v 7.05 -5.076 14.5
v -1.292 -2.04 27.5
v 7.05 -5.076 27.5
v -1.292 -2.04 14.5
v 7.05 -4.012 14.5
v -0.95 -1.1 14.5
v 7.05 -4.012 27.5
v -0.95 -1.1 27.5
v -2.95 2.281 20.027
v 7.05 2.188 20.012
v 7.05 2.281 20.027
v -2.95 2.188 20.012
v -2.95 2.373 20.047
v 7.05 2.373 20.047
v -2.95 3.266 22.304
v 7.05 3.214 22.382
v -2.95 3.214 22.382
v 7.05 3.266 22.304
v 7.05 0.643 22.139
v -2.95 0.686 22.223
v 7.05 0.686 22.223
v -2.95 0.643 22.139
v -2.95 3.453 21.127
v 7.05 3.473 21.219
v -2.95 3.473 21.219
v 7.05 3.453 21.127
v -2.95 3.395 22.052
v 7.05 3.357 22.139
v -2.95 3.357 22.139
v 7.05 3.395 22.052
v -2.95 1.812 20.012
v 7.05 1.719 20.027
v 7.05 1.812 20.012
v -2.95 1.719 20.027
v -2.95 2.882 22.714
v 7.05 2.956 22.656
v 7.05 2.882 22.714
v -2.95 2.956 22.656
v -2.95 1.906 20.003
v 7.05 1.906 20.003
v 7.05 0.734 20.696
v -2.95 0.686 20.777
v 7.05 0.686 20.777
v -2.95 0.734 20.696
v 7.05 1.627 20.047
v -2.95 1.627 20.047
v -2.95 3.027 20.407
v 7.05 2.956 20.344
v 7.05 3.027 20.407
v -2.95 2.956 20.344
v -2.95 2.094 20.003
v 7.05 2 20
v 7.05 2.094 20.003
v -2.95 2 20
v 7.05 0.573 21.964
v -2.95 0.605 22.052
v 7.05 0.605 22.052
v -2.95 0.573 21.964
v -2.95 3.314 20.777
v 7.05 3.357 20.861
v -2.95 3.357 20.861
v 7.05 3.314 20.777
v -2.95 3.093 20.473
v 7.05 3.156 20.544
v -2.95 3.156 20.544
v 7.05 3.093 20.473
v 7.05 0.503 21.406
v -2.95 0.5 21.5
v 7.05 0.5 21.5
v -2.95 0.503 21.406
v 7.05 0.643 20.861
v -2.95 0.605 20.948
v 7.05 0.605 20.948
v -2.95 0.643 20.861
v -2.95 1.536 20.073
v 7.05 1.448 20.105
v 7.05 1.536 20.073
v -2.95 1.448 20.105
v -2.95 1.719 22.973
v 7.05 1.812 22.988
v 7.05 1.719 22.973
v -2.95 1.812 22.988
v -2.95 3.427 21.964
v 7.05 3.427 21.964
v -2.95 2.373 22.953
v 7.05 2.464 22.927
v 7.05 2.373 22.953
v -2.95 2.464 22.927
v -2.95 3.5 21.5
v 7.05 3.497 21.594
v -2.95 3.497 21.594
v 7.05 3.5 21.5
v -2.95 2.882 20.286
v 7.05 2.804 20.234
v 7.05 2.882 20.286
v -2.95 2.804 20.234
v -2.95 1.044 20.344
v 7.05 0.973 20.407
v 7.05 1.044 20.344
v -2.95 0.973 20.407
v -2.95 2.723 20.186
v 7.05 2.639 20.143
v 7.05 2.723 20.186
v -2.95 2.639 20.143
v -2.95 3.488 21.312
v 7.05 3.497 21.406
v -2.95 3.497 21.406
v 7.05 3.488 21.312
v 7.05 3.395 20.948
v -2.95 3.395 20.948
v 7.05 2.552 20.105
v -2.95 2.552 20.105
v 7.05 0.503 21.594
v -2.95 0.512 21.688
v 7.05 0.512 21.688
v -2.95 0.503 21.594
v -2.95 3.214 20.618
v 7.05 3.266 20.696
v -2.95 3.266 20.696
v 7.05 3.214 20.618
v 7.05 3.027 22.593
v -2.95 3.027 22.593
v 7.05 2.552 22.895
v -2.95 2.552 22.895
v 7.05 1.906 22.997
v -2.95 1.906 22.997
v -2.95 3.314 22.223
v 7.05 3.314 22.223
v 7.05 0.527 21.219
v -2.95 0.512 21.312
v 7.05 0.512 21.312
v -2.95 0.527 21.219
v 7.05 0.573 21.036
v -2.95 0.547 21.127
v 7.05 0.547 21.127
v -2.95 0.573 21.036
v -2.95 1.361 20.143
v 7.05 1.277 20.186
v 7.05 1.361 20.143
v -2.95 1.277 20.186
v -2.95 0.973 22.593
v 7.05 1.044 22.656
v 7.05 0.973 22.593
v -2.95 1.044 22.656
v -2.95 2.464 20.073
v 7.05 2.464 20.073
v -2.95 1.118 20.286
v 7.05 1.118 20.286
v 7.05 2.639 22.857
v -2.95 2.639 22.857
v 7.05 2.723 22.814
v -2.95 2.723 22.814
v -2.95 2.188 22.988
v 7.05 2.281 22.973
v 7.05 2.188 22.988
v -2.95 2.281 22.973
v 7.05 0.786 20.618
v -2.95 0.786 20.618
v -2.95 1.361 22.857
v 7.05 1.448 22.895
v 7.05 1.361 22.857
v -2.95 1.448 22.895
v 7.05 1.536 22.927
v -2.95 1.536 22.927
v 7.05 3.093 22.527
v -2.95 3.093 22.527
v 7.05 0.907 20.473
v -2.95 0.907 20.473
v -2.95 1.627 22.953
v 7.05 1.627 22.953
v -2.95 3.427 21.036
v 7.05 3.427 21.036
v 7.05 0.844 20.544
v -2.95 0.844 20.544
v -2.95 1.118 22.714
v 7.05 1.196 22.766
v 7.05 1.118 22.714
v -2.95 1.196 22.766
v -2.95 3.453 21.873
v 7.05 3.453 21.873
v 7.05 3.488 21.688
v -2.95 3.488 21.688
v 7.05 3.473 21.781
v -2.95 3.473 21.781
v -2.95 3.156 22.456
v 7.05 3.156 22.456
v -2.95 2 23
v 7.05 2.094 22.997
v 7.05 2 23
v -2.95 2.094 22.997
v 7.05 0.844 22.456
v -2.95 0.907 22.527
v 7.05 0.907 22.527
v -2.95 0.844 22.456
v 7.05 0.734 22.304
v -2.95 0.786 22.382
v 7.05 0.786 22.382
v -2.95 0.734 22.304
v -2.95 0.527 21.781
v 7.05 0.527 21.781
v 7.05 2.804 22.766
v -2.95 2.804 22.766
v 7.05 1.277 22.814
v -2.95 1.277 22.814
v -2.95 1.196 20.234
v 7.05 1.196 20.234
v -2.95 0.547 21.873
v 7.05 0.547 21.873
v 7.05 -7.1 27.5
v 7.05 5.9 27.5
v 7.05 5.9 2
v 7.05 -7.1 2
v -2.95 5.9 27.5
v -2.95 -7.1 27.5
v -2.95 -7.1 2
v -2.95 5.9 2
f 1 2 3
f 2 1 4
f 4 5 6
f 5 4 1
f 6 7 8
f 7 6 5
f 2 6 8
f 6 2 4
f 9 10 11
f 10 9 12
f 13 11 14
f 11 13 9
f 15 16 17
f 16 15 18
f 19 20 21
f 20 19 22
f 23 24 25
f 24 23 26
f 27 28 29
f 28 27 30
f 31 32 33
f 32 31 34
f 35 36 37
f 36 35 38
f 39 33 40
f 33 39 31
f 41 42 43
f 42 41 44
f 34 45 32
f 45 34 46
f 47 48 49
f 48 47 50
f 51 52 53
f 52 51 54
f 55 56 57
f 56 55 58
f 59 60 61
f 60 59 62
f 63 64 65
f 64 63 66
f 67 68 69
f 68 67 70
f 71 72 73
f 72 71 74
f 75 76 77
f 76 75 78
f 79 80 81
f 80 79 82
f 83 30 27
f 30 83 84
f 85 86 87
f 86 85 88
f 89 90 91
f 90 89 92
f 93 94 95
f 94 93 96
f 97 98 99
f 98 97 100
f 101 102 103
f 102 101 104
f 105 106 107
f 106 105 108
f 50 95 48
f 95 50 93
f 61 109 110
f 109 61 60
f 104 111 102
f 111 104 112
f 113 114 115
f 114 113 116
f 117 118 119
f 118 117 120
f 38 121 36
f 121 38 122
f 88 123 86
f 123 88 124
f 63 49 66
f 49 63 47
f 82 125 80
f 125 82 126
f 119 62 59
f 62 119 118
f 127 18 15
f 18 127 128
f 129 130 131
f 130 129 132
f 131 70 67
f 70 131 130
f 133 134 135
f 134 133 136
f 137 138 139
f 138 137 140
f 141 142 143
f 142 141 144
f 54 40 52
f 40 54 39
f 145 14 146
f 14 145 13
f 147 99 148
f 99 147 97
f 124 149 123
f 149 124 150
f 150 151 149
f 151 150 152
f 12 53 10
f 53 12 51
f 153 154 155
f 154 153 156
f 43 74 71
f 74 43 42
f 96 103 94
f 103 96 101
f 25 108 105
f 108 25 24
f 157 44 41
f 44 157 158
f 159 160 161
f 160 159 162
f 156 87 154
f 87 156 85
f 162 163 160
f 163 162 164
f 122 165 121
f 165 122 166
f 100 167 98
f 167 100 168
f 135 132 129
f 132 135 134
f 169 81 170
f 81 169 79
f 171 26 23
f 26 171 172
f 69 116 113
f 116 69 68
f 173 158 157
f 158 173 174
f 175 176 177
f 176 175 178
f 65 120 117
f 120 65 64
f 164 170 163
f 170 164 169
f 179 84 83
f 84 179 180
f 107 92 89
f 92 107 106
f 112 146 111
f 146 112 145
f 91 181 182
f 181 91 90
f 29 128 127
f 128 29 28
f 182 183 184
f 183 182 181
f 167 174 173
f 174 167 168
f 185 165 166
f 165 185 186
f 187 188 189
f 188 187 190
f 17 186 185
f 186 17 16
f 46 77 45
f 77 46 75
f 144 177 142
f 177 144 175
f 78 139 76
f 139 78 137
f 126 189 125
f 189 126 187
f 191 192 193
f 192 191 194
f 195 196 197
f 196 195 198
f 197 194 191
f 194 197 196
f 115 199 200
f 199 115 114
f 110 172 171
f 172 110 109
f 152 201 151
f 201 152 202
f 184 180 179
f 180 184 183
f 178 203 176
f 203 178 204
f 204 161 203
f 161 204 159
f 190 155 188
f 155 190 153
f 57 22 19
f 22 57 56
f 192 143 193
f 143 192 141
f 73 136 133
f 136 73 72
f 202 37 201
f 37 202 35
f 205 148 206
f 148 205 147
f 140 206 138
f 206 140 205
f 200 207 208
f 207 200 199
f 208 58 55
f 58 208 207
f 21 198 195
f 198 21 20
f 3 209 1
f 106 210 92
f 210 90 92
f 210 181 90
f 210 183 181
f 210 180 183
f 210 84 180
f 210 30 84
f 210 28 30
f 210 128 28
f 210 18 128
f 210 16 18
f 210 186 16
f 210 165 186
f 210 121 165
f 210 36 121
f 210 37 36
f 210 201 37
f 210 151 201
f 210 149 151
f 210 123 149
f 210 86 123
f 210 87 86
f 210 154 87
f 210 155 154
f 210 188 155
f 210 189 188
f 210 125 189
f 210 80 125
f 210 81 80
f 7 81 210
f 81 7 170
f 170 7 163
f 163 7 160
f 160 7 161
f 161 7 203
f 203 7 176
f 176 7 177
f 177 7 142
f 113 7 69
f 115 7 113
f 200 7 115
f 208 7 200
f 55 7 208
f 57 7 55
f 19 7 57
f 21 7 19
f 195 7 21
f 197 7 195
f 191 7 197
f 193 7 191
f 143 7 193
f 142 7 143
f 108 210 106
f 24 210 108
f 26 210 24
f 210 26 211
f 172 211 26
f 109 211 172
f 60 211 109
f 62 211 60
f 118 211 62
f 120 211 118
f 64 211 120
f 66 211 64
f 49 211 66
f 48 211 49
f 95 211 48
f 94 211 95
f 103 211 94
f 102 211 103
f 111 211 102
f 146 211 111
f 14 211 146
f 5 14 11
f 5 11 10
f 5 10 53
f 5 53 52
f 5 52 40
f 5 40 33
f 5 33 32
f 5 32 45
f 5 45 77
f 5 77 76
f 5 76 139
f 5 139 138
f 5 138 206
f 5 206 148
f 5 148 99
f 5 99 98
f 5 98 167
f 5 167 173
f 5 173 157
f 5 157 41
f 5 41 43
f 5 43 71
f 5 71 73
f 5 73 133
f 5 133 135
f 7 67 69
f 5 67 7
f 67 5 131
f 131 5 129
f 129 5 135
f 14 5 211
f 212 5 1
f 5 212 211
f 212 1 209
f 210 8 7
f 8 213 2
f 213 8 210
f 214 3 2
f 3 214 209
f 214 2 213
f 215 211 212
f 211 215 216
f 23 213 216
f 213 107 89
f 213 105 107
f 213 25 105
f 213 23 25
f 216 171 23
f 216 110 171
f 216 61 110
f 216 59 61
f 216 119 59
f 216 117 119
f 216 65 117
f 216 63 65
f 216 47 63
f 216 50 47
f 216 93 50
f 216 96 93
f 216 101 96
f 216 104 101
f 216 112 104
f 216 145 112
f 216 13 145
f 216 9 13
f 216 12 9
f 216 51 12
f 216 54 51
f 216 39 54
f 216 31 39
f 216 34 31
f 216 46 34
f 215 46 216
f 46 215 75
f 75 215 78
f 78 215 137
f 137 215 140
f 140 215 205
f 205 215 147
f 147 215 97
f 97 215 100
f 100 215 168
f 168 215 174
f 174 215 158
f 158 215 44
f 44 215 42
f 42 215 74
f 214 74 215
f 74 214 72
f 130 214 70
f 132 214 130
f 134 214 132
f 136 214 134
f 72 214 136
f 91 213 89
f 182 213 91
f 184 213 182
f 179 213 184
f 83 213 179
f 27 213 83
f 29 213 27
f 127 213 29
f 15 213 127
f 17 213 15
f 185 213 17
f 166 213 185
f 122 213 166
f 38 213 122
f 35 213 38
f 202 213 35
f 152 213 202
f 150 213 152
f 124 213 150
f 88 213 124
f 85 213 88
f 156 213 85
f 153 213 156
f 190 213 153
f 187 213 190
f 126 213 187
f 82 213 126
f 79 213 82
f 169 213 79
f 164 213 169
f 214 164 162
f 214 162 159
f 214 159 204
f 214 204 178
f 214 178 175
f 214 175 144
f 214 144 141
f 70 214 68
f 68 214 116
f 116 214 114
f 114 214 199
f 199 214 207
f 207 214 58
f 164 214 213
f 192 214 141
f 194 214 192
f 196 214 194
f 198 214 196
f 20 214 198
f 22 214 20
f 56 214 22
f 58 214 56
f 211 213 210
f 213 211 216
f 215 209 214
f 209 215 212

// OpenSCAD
breedte = 22.7;
hele_breedte = 32.5;
diepte = 27;
dikte_rand = 2.5;
marge = 0.2;


motor_breedte = hele_breedte+marge*2;
motor_lengte = diepte+marge*2;

breedte_ruimte_tussen_2_motoren = 2;
lengte_ruimte_tussen_2_motoren = 2;


difference(){
	union(){
         
        translate([-motor_breedte/2+9.5+4   ,  -motor_lengte-motor_lengte/2-lengte_ruimte_tussen_2_motoren+6+30,2]){
            cube([
            10
            ,13
            ,15+10.5], center=false);
        }        


	}
	union() {
        translate([-motor_breedte/2+9.5+2+4   ,  -motor_lengte-motor_lengte/2-lengte_ruimte_tussen_2_motoren+6+36,4+10.5]){
            rotate([0,0,-110]){
                cube([
                1
                ,15
                ,30], center=false);
            }
        }       
// DEZE
        translate([-25,2,21.5]){
            rotate([0,90,0]){
                cylinder(h=400, r=1.5, $fn=100, center=false);
            }
        }   
   
        

	}
}
